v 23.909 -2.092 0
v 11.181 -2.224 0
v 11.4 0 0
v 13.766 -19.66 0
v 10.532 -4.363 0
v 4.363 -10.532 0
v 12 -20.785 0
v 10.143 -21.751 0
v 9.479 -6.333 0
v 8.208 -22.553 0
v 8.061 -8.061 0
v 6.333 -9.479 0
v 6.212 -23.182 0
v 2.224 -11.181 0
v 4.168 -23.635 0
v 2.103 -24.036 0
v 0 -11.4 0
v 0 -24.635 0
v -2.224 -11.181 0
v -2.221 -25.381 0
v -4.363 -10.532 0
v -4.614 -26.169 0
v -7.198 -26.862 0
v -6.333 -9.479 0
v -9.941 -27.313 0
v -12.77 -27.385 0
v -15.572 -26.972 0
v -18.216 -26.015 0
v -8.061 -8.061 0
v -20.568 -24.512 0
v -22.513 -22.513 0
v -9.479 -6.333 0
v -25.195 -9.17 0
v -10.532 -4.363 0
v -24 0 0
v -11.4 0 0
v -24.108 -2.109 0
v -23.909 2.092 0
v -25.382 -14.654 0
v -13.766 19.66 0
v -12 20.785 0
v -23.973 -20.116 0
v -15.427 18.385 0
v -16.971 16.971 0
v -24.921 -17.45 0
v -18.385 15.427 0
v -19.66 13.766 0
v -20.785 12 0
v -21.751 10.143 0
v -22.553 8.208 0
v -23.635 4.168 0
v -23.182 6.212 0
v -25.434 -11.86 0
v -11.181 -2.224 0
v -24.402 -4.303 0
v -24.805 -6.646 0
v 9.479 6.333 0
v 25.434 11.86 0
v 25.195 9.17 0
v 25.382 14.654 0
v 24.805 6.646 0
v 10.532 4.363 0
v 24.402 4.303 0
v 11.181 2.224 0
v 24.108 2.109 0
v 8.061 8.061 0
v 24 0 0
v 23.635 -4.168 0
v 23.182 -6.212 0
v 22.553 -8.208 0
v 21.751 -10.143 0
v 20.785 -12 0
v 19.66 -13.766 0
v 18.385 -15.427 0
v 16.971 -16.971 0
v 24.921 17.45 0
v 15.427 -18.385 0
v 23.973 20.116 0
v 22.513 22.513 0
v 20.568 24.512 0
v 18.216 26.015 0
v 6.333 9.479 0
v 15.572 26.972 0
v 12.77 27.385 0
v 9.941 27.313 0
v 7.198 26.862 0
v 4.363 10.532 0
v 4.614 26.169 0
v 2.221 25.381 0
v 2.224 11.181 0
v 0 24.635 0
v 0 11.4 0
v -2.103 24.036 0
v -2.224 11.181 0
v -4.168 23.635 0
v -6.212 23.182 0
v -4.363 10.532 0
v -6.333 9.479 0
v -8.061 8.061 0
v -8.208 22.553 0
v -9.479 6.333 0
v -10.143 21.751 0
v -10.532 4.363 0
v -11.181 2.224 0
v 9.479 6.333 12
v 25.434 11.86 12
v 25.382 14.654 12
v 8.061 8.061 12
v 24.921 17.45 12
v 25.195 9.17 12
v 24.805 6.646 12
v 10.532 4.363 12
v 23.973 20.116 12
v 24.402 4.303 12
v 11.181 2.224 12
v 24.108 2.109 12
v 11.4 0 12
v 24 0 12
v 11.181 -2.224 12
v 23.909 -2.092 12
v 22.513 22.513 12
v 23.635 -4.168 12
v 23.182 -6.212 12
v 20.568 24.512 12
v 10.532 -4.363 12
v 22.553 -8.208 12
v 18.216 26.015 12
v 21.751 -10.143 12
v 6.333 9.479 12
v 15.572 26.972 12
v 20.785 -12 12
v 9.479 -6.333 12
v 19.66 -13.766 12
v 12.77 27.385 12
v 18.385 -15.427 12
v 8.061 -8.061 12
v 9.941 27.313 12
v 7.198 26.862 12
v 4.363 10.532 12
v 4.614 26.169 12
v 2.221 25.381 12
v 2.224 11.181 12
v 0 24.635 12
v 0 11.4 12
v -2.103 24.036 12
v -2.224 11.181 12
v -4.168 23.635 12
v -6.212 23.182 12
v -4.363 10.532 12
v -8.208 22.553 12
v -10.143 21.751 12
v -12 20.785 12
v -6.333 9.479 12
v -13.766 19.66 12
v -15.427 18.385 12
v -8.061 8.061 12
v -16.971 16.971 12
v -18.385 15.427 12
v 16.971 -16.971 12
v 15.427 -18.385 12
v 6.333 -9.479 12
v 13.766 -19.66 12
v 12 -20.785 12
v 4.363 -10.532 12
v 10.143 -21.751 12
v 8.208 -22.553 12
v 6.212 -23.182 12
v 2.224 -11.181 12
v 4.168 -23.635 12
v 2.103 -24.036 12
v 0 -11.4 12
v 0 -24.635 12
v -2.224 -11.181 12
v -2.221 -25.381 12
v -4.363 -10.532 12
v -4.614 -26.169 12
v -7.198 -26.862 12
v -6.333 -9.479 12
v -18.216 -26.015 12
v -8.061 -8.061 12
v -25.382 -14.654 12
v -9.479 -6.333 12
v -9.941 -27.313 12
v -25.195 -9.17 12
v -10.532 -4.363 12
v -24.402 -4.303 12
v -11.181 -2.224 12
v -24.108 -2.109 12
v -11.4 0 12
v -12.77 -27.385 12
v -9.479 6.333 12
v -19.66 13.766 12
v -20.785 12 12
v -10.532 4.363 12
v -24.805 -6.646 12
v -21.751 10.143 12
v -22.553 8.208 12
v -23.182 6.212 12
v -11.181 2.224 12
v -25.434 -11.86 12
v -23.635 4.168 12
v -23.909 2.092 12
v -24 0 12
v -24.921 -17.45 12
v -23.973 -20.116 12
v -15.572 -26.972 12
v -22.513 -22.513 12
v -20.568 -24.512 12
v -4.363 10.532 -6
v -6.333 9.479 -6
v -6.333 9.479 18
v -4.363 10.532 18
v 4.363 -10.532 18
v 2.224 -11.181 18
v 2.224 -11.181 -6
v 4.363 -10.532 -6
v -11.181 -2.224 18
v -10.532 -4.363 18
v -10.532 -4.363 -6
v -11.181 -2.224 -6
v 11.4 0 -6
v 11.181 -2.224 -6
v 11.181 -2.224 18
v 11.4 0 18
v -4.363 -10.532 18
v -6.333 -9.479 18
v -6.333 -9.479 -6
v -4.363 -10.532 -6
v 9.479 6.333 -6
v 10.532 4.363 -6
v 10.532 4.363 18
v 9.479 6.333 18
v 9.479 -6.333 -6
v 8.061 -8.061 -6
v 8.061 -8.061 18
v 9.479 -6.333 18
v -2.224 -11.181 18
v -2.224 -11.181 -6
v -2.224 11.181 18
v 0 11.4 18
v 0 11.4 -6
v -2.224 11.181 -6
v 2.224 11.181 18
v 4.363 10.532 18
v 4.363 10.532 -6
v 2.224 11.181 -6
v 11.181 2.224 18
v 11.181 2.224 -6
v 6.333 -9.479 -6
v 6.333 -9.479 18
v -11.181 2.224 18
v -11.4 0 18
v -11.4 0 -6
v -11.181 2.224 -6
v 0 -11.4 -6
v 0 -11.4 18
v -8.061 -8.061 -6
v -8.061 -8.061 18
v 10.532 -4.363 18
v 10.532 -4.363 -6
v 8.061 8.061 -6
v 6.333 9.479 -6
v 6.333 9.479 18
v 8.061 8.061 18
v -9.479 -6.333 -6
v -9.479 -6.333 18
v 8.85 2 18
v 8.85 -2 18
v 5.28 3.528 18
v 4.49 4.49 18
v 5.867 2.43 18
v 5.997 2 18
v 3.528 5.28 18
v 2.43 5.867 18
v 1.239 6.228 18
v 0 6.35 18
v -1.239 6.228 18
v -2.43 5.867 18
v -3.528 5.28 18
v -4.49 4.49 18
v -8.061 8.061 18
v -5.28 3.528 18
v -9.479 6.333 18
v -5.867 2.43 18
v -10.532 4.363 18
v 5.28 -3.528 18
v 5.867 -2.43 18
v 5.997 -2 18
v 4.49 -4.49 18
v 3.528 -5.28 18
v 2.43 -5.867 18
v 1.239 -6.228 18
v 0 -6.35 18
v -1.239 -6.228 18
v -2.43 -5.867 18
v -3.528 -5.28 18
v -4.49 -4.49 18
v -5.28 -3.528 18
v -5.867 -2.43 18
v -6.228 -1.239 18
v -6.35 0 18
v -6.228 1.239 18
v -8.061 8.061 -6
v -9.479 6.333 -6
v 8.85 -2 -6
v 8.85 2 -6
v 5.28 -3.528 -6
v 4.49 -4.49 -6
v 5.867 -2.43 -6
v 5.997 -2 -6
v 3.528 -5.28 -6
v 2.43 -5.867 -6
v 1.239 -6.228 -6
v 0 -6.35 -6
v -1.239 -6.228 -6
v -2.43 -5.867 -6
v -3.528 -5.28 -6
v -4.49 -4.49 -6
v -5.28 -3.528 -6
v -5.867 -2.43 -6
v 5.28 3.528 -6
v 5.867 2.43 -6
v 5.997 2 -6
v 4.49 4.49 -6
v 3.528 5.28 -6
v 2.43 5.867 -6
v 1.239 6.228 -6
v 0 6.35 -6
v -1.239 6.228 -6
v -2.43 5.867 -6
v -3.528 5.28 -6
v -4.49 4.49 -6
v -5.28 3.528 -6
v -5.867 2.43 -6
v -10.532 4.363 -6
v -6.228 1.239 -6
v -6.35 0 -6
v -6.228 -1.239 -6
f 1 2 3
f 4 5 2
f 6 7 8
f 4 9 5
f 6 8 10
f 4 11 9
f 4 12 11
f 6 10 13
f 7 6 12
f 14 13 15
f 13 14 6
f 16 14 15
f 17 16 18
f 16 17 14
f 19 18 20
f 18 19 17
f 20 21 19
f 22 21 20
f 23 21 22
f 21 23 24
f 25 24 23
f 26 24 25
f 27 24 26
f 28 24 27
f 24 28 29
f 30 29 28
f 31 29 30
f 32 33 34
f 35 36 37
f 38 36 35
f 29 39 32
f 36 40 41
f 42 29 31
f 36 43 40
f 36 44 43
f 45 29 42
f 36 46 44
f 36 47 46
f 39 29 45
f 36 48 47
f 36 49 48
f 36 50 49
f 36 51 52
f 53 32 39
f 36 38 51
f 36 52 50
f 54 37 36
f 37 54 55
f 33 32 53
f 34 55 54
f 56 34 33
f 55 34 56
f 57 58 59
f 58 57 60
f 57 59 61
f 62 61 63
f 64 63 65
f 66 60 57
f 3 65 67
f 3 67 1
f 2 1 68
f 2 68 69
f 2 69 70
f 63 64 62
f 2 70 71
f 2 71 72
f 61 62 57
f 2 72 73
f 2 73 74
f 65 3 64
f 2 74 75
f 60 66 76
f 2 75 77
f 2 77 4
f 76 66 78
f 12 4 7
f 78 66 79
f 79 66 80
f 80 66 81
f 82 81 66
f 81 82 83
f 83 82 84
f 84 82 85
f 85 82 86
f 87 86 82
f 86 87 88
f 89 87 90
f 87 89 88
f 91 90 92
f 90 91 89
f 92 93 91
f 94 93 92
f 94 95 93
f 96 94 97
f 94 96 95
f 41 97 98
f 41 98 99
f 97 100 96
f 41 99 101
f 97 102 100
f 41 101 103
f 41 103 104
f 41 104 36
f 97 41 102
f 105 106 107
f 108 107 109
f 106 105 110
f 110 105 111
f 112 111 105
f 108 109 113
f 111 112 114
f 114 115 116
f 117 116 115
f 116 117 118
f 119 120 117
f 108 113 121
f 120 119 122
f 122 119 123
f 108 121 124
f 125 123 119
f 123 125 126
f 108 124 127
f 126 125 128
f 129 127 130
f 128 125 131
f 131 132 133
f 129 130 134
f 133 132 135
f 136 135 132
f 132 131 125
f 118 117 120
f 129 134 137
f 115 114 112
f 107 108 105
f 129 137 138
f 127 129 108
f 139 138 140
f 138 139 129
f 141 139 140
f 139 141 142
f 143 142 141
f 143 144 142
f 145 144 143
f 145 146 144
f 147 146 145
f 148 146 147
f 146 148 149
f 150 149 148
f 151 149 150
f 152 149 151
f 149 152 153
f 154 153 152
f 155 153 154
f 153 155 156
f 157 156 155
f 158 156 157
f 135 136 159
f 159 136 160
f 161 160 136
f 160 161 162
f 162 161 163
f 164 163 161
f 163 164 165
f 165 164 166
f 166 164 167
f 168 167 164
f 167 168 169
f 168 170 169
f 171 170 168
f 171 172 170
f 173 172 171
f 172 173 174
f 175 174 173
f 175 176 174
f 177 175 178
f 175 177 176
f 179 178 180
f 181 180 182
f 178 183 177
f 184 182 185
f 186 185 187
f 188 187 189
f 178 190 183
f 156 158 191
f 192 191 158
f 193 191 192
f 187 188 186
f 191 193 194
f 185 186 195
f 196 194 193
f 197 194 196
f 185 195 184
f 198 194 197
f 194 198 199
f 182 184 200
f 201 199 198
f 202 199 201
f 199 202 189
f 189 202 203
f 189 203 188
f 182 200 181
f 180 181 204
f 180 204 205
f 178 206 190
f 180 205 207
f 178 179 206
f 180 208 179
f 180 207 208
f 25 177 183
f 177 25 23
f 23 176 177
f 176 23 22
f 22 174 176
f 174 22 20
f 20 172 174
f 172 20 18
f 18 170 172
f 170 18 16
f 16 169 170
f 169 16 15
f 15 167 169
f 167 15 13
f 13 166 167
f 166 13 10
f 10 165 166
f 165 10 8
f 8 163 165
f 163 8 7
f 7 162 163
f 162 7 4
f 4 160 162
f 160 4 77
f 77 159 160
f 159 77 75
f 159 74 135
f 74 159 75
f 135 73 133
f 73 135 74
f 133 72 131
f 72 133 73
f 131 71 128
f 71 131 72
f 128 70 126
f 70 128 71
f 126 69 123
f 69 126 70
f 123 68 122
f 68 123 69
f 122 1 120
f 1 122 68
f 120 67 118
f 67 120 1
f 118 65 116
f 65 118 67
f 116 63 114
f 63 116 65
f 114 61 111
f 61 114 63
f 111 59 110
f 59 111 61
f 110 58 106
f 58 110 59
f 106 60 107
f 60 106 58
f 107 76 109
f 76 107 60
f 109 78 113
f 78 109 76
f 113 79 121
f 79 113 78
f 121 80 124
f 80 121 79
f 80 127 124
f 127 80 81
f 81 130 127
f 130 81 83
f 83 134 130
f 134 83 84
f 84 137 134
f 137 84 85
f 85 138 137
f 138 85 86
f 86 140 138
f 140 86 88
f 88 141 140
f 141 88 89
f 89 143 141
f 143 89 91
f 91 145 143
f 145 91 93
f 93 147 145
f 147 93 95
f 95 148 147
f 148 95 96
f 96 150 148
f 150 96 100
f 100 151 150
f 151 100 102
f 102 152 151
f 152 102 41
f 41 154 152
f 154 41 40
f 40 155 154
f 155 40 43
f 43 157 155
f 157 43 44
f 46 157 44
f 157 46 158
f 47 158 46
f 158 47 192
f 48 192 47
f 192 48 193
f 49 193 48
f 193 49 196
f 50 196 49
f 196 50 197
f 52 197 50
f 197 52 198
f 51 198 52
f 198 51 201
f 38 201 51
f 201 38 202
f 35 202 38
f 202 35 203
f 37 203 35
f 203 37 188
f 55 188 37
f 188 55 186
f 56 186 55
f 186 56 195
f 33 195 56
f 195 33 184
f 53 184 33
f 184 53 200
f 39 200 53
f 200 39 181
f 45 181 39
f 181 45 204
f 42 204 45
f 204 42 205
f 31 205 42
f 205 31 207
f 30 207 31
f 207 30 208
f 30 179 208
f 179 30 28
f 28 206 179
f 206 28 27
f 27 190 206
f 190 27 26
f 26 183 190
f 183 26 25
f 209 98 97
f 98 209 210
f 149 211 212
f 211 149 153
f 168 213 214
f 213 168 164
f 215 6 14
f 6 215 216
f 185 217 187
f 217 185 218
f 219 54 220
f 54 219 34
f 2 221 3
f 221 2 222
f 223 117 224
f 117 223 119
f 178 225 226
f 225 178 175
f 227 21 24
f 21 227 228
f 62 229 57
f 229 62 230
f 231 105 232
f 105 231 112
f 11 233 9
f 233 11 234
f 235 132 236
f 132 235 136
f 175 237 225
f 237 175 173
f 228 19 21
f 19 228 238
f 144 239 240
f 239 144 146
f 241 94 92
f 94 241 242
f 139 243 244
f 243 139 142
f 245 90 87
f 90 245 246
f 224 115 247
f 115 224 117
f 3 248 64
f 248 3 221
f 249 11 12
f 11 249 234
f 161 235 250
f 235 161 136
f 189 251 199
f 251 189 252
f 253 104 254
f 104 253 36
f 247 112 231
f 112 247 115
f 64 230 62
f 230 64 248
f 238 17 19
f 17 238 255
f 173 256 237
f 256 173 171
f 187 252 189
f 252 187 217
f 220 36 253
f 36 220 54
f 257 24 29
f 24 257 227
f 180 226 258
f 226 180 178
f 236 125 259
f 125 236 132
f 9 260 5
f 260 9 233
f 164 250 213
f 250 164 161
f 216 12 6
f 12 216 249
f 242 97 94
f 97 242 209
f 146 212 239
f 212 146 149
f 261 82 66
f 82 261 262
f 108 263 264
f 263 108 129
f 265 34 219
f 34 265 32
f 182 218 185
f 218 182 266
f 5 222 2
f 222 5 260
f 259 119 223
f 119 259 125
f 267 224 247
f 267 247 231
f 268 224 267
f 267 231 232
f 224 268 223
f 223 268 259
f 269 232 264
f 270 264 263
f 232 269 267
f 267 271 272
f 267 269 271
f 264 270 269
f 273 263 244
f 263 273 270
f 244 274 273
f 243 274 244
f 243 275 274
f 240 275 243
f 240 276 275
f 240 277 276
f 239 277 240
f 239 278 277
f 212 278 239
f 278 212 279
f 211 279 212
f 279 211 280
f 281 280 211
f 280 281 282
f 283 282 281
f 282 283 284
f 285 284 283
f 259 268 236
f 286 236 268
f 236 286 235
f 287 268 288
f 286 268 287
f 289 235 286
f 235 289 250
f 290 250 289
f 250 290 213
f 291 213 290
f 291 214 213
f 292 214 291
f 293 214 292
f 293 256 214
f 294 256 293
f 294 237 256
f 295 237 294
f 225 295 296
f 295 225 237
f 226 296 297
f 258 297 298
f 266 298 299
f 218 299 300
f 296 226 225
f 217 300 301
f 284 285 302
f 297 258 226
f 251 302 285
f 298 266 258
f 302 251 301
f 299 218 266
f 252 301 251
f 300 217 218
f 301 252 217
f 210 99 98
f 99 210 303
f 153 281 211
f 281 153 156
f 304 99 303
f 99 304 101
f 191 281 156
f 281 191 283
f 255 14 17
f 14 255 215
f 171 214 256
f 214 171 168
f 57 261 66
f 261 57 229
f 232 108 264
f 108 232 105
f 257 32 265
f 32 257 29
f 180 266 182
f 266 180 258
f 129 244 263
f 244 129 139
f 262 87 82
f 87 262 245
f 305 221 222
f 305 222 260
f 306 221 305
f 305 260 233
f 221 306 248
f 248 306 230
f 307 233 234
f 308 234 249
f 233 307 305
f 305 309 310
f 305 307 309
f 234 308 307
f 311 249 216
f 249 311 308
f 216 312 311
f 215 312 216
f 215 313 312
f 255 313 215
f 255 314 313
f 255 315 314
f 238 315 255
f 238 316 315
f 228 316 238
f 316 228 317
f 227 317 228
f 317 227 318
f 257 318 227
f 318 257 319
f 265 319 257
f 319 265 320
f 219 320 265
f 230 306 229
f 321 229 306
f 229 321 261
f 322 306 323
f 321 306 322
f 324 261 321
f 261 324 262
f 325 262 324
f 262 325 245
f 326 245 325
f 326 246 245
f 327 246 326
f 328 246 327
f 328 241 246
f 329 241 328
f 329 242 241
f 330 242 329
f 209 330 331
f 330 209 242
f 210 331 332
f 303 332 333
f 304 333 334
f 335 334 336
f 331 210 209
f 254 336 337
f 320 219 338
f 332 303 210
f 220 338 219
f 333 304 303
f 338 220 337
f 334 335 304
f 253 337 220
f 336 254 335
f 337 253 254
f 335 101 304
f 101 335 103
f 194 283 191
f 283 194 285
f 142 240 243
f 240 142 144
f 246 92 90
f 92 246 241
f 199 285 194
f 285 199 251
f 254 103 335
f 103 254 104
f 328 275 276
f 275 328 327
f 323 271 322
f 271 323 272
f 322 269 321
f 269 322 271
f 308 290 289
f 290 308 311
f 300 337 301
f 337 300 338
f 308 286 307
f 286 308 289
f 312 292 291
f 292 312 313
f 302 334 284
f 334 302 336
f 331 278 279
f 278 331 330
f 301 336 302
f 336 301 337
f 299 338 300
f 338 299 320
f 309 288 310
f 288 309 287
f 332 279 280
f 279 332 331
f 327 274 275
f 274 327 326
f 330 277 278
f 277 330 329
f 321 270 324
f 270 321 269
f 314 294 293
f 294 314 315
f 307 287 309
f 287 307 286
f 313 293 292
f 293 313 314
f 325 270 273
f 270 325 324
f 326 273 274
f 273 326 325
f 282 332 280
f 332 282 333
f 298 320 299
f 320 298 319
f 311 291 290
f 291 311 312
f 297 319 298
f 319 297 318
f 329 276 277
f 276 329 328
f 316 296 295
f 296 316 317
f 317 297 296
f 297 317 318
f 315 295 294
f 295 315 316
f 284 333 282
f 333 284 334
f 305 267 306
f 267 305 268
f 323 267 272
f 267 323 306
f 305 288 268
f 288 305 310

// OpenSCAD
$fn = 32;

// ----------------------------------------------------------------------
// Cam: base radius 24 mm with a 8 mm lift over 180 degrees
// ----------------------------------------------------------------------

// --- parameters (mm) ---
base_r = 24;              // base radius
lift = 8;                 // lift height above the base radius
lift_span = 180;          // angular width of the lift
lift_start = 0;           // angle where the lift starts
cam_t = 12;               // cam plate thickness
hub_d = 22.8;             // hub diameter
hub_h = 24;               // hub height
bore_d = 12.7;            // bore
key_w = 4;                // keyway width
key_depth = 2;            // keyway depth

cam_profile = [[24, 0], [24.108, 2.109], [24.402, 4.303], [24.805, 6.646], [25.195, 9.17], [25.434, 11.86], [25.382, 14.654], [24.921, 17.45], [23.973, 20.116], [22.513, 22.513], [20.568, 24.512], [18.216, 26.015], [15.572, 26.972], [12.77, 27.385], [9.941, 27.313], [7.198, 26.862], [4.614, 26.169], [2.221, 25.381], [0, 24.635], [-2.103, 24.036], [-4.168, 23.635], [-6.212, 23.182], [-8.208, 22.553], [-10.143, 21.751], [-12, 20.785], [-13.766, 19.66], [-15.427, 18.385], [-16.971, 16.971], [-18.385, 15.427], [-19.66, 13.766], [-20.785, 12], [-21.751, 10.143], [-22.553, 8.208], [-23.182, 6.212], [-23.635, 4.168], [-23.909, 2.092], [-24, 0], [-24.108, -2.109], [-24.402, -4.303], [-24.805, -6.646], [-25.195, -9.17], [-25.434, -11.86], [-25.382, -14.654], [-24.921, -17.45], [-23.973, -20.116], [-22.513, -22.513], [-20.568, -24.512], [-18.216, -26.015], [-15.572, -26.972], [-12.77, -27.385], [-9.941, -27.313], [-7.198, -26.862], [-4.614, -26.169], [-2.221, -25.381], [0, -24.635], [2.103, -24.036], [4.168, -23.635], [6.212, -23.182], [8.208, -22.553], [10.143, -21.751], [12, -20.785], [13.766, -19.66], [15.427, -18.385], [16.971, -16.971], [18.385, -15.427], [19.66, -13.766], [20.785, -12], [21.751, -10.143], [22.553, -8.208], [23.182, -6.212], [23.635, -4.168], [23.909, -2.092]];

difference() {
  union() {
    linear_extrude(height = cam_t) polygon(cam_profile);
    /* hub, proud of the cam plate on both sides */
    translate([0, 0, -6]) cylinder(h = hub_h, d = hub_d);
  }
  /* bore through the hub, 2.5 mm clear on both faces */
  translate([0, 0, -8.5]) cylinder(h = hub_h + 5, d = bore_d);
  /* keyway, milled through the whole hub */
  translate([4.35, -2, -8.5]) cube([4.5, 4, 29]);
}
